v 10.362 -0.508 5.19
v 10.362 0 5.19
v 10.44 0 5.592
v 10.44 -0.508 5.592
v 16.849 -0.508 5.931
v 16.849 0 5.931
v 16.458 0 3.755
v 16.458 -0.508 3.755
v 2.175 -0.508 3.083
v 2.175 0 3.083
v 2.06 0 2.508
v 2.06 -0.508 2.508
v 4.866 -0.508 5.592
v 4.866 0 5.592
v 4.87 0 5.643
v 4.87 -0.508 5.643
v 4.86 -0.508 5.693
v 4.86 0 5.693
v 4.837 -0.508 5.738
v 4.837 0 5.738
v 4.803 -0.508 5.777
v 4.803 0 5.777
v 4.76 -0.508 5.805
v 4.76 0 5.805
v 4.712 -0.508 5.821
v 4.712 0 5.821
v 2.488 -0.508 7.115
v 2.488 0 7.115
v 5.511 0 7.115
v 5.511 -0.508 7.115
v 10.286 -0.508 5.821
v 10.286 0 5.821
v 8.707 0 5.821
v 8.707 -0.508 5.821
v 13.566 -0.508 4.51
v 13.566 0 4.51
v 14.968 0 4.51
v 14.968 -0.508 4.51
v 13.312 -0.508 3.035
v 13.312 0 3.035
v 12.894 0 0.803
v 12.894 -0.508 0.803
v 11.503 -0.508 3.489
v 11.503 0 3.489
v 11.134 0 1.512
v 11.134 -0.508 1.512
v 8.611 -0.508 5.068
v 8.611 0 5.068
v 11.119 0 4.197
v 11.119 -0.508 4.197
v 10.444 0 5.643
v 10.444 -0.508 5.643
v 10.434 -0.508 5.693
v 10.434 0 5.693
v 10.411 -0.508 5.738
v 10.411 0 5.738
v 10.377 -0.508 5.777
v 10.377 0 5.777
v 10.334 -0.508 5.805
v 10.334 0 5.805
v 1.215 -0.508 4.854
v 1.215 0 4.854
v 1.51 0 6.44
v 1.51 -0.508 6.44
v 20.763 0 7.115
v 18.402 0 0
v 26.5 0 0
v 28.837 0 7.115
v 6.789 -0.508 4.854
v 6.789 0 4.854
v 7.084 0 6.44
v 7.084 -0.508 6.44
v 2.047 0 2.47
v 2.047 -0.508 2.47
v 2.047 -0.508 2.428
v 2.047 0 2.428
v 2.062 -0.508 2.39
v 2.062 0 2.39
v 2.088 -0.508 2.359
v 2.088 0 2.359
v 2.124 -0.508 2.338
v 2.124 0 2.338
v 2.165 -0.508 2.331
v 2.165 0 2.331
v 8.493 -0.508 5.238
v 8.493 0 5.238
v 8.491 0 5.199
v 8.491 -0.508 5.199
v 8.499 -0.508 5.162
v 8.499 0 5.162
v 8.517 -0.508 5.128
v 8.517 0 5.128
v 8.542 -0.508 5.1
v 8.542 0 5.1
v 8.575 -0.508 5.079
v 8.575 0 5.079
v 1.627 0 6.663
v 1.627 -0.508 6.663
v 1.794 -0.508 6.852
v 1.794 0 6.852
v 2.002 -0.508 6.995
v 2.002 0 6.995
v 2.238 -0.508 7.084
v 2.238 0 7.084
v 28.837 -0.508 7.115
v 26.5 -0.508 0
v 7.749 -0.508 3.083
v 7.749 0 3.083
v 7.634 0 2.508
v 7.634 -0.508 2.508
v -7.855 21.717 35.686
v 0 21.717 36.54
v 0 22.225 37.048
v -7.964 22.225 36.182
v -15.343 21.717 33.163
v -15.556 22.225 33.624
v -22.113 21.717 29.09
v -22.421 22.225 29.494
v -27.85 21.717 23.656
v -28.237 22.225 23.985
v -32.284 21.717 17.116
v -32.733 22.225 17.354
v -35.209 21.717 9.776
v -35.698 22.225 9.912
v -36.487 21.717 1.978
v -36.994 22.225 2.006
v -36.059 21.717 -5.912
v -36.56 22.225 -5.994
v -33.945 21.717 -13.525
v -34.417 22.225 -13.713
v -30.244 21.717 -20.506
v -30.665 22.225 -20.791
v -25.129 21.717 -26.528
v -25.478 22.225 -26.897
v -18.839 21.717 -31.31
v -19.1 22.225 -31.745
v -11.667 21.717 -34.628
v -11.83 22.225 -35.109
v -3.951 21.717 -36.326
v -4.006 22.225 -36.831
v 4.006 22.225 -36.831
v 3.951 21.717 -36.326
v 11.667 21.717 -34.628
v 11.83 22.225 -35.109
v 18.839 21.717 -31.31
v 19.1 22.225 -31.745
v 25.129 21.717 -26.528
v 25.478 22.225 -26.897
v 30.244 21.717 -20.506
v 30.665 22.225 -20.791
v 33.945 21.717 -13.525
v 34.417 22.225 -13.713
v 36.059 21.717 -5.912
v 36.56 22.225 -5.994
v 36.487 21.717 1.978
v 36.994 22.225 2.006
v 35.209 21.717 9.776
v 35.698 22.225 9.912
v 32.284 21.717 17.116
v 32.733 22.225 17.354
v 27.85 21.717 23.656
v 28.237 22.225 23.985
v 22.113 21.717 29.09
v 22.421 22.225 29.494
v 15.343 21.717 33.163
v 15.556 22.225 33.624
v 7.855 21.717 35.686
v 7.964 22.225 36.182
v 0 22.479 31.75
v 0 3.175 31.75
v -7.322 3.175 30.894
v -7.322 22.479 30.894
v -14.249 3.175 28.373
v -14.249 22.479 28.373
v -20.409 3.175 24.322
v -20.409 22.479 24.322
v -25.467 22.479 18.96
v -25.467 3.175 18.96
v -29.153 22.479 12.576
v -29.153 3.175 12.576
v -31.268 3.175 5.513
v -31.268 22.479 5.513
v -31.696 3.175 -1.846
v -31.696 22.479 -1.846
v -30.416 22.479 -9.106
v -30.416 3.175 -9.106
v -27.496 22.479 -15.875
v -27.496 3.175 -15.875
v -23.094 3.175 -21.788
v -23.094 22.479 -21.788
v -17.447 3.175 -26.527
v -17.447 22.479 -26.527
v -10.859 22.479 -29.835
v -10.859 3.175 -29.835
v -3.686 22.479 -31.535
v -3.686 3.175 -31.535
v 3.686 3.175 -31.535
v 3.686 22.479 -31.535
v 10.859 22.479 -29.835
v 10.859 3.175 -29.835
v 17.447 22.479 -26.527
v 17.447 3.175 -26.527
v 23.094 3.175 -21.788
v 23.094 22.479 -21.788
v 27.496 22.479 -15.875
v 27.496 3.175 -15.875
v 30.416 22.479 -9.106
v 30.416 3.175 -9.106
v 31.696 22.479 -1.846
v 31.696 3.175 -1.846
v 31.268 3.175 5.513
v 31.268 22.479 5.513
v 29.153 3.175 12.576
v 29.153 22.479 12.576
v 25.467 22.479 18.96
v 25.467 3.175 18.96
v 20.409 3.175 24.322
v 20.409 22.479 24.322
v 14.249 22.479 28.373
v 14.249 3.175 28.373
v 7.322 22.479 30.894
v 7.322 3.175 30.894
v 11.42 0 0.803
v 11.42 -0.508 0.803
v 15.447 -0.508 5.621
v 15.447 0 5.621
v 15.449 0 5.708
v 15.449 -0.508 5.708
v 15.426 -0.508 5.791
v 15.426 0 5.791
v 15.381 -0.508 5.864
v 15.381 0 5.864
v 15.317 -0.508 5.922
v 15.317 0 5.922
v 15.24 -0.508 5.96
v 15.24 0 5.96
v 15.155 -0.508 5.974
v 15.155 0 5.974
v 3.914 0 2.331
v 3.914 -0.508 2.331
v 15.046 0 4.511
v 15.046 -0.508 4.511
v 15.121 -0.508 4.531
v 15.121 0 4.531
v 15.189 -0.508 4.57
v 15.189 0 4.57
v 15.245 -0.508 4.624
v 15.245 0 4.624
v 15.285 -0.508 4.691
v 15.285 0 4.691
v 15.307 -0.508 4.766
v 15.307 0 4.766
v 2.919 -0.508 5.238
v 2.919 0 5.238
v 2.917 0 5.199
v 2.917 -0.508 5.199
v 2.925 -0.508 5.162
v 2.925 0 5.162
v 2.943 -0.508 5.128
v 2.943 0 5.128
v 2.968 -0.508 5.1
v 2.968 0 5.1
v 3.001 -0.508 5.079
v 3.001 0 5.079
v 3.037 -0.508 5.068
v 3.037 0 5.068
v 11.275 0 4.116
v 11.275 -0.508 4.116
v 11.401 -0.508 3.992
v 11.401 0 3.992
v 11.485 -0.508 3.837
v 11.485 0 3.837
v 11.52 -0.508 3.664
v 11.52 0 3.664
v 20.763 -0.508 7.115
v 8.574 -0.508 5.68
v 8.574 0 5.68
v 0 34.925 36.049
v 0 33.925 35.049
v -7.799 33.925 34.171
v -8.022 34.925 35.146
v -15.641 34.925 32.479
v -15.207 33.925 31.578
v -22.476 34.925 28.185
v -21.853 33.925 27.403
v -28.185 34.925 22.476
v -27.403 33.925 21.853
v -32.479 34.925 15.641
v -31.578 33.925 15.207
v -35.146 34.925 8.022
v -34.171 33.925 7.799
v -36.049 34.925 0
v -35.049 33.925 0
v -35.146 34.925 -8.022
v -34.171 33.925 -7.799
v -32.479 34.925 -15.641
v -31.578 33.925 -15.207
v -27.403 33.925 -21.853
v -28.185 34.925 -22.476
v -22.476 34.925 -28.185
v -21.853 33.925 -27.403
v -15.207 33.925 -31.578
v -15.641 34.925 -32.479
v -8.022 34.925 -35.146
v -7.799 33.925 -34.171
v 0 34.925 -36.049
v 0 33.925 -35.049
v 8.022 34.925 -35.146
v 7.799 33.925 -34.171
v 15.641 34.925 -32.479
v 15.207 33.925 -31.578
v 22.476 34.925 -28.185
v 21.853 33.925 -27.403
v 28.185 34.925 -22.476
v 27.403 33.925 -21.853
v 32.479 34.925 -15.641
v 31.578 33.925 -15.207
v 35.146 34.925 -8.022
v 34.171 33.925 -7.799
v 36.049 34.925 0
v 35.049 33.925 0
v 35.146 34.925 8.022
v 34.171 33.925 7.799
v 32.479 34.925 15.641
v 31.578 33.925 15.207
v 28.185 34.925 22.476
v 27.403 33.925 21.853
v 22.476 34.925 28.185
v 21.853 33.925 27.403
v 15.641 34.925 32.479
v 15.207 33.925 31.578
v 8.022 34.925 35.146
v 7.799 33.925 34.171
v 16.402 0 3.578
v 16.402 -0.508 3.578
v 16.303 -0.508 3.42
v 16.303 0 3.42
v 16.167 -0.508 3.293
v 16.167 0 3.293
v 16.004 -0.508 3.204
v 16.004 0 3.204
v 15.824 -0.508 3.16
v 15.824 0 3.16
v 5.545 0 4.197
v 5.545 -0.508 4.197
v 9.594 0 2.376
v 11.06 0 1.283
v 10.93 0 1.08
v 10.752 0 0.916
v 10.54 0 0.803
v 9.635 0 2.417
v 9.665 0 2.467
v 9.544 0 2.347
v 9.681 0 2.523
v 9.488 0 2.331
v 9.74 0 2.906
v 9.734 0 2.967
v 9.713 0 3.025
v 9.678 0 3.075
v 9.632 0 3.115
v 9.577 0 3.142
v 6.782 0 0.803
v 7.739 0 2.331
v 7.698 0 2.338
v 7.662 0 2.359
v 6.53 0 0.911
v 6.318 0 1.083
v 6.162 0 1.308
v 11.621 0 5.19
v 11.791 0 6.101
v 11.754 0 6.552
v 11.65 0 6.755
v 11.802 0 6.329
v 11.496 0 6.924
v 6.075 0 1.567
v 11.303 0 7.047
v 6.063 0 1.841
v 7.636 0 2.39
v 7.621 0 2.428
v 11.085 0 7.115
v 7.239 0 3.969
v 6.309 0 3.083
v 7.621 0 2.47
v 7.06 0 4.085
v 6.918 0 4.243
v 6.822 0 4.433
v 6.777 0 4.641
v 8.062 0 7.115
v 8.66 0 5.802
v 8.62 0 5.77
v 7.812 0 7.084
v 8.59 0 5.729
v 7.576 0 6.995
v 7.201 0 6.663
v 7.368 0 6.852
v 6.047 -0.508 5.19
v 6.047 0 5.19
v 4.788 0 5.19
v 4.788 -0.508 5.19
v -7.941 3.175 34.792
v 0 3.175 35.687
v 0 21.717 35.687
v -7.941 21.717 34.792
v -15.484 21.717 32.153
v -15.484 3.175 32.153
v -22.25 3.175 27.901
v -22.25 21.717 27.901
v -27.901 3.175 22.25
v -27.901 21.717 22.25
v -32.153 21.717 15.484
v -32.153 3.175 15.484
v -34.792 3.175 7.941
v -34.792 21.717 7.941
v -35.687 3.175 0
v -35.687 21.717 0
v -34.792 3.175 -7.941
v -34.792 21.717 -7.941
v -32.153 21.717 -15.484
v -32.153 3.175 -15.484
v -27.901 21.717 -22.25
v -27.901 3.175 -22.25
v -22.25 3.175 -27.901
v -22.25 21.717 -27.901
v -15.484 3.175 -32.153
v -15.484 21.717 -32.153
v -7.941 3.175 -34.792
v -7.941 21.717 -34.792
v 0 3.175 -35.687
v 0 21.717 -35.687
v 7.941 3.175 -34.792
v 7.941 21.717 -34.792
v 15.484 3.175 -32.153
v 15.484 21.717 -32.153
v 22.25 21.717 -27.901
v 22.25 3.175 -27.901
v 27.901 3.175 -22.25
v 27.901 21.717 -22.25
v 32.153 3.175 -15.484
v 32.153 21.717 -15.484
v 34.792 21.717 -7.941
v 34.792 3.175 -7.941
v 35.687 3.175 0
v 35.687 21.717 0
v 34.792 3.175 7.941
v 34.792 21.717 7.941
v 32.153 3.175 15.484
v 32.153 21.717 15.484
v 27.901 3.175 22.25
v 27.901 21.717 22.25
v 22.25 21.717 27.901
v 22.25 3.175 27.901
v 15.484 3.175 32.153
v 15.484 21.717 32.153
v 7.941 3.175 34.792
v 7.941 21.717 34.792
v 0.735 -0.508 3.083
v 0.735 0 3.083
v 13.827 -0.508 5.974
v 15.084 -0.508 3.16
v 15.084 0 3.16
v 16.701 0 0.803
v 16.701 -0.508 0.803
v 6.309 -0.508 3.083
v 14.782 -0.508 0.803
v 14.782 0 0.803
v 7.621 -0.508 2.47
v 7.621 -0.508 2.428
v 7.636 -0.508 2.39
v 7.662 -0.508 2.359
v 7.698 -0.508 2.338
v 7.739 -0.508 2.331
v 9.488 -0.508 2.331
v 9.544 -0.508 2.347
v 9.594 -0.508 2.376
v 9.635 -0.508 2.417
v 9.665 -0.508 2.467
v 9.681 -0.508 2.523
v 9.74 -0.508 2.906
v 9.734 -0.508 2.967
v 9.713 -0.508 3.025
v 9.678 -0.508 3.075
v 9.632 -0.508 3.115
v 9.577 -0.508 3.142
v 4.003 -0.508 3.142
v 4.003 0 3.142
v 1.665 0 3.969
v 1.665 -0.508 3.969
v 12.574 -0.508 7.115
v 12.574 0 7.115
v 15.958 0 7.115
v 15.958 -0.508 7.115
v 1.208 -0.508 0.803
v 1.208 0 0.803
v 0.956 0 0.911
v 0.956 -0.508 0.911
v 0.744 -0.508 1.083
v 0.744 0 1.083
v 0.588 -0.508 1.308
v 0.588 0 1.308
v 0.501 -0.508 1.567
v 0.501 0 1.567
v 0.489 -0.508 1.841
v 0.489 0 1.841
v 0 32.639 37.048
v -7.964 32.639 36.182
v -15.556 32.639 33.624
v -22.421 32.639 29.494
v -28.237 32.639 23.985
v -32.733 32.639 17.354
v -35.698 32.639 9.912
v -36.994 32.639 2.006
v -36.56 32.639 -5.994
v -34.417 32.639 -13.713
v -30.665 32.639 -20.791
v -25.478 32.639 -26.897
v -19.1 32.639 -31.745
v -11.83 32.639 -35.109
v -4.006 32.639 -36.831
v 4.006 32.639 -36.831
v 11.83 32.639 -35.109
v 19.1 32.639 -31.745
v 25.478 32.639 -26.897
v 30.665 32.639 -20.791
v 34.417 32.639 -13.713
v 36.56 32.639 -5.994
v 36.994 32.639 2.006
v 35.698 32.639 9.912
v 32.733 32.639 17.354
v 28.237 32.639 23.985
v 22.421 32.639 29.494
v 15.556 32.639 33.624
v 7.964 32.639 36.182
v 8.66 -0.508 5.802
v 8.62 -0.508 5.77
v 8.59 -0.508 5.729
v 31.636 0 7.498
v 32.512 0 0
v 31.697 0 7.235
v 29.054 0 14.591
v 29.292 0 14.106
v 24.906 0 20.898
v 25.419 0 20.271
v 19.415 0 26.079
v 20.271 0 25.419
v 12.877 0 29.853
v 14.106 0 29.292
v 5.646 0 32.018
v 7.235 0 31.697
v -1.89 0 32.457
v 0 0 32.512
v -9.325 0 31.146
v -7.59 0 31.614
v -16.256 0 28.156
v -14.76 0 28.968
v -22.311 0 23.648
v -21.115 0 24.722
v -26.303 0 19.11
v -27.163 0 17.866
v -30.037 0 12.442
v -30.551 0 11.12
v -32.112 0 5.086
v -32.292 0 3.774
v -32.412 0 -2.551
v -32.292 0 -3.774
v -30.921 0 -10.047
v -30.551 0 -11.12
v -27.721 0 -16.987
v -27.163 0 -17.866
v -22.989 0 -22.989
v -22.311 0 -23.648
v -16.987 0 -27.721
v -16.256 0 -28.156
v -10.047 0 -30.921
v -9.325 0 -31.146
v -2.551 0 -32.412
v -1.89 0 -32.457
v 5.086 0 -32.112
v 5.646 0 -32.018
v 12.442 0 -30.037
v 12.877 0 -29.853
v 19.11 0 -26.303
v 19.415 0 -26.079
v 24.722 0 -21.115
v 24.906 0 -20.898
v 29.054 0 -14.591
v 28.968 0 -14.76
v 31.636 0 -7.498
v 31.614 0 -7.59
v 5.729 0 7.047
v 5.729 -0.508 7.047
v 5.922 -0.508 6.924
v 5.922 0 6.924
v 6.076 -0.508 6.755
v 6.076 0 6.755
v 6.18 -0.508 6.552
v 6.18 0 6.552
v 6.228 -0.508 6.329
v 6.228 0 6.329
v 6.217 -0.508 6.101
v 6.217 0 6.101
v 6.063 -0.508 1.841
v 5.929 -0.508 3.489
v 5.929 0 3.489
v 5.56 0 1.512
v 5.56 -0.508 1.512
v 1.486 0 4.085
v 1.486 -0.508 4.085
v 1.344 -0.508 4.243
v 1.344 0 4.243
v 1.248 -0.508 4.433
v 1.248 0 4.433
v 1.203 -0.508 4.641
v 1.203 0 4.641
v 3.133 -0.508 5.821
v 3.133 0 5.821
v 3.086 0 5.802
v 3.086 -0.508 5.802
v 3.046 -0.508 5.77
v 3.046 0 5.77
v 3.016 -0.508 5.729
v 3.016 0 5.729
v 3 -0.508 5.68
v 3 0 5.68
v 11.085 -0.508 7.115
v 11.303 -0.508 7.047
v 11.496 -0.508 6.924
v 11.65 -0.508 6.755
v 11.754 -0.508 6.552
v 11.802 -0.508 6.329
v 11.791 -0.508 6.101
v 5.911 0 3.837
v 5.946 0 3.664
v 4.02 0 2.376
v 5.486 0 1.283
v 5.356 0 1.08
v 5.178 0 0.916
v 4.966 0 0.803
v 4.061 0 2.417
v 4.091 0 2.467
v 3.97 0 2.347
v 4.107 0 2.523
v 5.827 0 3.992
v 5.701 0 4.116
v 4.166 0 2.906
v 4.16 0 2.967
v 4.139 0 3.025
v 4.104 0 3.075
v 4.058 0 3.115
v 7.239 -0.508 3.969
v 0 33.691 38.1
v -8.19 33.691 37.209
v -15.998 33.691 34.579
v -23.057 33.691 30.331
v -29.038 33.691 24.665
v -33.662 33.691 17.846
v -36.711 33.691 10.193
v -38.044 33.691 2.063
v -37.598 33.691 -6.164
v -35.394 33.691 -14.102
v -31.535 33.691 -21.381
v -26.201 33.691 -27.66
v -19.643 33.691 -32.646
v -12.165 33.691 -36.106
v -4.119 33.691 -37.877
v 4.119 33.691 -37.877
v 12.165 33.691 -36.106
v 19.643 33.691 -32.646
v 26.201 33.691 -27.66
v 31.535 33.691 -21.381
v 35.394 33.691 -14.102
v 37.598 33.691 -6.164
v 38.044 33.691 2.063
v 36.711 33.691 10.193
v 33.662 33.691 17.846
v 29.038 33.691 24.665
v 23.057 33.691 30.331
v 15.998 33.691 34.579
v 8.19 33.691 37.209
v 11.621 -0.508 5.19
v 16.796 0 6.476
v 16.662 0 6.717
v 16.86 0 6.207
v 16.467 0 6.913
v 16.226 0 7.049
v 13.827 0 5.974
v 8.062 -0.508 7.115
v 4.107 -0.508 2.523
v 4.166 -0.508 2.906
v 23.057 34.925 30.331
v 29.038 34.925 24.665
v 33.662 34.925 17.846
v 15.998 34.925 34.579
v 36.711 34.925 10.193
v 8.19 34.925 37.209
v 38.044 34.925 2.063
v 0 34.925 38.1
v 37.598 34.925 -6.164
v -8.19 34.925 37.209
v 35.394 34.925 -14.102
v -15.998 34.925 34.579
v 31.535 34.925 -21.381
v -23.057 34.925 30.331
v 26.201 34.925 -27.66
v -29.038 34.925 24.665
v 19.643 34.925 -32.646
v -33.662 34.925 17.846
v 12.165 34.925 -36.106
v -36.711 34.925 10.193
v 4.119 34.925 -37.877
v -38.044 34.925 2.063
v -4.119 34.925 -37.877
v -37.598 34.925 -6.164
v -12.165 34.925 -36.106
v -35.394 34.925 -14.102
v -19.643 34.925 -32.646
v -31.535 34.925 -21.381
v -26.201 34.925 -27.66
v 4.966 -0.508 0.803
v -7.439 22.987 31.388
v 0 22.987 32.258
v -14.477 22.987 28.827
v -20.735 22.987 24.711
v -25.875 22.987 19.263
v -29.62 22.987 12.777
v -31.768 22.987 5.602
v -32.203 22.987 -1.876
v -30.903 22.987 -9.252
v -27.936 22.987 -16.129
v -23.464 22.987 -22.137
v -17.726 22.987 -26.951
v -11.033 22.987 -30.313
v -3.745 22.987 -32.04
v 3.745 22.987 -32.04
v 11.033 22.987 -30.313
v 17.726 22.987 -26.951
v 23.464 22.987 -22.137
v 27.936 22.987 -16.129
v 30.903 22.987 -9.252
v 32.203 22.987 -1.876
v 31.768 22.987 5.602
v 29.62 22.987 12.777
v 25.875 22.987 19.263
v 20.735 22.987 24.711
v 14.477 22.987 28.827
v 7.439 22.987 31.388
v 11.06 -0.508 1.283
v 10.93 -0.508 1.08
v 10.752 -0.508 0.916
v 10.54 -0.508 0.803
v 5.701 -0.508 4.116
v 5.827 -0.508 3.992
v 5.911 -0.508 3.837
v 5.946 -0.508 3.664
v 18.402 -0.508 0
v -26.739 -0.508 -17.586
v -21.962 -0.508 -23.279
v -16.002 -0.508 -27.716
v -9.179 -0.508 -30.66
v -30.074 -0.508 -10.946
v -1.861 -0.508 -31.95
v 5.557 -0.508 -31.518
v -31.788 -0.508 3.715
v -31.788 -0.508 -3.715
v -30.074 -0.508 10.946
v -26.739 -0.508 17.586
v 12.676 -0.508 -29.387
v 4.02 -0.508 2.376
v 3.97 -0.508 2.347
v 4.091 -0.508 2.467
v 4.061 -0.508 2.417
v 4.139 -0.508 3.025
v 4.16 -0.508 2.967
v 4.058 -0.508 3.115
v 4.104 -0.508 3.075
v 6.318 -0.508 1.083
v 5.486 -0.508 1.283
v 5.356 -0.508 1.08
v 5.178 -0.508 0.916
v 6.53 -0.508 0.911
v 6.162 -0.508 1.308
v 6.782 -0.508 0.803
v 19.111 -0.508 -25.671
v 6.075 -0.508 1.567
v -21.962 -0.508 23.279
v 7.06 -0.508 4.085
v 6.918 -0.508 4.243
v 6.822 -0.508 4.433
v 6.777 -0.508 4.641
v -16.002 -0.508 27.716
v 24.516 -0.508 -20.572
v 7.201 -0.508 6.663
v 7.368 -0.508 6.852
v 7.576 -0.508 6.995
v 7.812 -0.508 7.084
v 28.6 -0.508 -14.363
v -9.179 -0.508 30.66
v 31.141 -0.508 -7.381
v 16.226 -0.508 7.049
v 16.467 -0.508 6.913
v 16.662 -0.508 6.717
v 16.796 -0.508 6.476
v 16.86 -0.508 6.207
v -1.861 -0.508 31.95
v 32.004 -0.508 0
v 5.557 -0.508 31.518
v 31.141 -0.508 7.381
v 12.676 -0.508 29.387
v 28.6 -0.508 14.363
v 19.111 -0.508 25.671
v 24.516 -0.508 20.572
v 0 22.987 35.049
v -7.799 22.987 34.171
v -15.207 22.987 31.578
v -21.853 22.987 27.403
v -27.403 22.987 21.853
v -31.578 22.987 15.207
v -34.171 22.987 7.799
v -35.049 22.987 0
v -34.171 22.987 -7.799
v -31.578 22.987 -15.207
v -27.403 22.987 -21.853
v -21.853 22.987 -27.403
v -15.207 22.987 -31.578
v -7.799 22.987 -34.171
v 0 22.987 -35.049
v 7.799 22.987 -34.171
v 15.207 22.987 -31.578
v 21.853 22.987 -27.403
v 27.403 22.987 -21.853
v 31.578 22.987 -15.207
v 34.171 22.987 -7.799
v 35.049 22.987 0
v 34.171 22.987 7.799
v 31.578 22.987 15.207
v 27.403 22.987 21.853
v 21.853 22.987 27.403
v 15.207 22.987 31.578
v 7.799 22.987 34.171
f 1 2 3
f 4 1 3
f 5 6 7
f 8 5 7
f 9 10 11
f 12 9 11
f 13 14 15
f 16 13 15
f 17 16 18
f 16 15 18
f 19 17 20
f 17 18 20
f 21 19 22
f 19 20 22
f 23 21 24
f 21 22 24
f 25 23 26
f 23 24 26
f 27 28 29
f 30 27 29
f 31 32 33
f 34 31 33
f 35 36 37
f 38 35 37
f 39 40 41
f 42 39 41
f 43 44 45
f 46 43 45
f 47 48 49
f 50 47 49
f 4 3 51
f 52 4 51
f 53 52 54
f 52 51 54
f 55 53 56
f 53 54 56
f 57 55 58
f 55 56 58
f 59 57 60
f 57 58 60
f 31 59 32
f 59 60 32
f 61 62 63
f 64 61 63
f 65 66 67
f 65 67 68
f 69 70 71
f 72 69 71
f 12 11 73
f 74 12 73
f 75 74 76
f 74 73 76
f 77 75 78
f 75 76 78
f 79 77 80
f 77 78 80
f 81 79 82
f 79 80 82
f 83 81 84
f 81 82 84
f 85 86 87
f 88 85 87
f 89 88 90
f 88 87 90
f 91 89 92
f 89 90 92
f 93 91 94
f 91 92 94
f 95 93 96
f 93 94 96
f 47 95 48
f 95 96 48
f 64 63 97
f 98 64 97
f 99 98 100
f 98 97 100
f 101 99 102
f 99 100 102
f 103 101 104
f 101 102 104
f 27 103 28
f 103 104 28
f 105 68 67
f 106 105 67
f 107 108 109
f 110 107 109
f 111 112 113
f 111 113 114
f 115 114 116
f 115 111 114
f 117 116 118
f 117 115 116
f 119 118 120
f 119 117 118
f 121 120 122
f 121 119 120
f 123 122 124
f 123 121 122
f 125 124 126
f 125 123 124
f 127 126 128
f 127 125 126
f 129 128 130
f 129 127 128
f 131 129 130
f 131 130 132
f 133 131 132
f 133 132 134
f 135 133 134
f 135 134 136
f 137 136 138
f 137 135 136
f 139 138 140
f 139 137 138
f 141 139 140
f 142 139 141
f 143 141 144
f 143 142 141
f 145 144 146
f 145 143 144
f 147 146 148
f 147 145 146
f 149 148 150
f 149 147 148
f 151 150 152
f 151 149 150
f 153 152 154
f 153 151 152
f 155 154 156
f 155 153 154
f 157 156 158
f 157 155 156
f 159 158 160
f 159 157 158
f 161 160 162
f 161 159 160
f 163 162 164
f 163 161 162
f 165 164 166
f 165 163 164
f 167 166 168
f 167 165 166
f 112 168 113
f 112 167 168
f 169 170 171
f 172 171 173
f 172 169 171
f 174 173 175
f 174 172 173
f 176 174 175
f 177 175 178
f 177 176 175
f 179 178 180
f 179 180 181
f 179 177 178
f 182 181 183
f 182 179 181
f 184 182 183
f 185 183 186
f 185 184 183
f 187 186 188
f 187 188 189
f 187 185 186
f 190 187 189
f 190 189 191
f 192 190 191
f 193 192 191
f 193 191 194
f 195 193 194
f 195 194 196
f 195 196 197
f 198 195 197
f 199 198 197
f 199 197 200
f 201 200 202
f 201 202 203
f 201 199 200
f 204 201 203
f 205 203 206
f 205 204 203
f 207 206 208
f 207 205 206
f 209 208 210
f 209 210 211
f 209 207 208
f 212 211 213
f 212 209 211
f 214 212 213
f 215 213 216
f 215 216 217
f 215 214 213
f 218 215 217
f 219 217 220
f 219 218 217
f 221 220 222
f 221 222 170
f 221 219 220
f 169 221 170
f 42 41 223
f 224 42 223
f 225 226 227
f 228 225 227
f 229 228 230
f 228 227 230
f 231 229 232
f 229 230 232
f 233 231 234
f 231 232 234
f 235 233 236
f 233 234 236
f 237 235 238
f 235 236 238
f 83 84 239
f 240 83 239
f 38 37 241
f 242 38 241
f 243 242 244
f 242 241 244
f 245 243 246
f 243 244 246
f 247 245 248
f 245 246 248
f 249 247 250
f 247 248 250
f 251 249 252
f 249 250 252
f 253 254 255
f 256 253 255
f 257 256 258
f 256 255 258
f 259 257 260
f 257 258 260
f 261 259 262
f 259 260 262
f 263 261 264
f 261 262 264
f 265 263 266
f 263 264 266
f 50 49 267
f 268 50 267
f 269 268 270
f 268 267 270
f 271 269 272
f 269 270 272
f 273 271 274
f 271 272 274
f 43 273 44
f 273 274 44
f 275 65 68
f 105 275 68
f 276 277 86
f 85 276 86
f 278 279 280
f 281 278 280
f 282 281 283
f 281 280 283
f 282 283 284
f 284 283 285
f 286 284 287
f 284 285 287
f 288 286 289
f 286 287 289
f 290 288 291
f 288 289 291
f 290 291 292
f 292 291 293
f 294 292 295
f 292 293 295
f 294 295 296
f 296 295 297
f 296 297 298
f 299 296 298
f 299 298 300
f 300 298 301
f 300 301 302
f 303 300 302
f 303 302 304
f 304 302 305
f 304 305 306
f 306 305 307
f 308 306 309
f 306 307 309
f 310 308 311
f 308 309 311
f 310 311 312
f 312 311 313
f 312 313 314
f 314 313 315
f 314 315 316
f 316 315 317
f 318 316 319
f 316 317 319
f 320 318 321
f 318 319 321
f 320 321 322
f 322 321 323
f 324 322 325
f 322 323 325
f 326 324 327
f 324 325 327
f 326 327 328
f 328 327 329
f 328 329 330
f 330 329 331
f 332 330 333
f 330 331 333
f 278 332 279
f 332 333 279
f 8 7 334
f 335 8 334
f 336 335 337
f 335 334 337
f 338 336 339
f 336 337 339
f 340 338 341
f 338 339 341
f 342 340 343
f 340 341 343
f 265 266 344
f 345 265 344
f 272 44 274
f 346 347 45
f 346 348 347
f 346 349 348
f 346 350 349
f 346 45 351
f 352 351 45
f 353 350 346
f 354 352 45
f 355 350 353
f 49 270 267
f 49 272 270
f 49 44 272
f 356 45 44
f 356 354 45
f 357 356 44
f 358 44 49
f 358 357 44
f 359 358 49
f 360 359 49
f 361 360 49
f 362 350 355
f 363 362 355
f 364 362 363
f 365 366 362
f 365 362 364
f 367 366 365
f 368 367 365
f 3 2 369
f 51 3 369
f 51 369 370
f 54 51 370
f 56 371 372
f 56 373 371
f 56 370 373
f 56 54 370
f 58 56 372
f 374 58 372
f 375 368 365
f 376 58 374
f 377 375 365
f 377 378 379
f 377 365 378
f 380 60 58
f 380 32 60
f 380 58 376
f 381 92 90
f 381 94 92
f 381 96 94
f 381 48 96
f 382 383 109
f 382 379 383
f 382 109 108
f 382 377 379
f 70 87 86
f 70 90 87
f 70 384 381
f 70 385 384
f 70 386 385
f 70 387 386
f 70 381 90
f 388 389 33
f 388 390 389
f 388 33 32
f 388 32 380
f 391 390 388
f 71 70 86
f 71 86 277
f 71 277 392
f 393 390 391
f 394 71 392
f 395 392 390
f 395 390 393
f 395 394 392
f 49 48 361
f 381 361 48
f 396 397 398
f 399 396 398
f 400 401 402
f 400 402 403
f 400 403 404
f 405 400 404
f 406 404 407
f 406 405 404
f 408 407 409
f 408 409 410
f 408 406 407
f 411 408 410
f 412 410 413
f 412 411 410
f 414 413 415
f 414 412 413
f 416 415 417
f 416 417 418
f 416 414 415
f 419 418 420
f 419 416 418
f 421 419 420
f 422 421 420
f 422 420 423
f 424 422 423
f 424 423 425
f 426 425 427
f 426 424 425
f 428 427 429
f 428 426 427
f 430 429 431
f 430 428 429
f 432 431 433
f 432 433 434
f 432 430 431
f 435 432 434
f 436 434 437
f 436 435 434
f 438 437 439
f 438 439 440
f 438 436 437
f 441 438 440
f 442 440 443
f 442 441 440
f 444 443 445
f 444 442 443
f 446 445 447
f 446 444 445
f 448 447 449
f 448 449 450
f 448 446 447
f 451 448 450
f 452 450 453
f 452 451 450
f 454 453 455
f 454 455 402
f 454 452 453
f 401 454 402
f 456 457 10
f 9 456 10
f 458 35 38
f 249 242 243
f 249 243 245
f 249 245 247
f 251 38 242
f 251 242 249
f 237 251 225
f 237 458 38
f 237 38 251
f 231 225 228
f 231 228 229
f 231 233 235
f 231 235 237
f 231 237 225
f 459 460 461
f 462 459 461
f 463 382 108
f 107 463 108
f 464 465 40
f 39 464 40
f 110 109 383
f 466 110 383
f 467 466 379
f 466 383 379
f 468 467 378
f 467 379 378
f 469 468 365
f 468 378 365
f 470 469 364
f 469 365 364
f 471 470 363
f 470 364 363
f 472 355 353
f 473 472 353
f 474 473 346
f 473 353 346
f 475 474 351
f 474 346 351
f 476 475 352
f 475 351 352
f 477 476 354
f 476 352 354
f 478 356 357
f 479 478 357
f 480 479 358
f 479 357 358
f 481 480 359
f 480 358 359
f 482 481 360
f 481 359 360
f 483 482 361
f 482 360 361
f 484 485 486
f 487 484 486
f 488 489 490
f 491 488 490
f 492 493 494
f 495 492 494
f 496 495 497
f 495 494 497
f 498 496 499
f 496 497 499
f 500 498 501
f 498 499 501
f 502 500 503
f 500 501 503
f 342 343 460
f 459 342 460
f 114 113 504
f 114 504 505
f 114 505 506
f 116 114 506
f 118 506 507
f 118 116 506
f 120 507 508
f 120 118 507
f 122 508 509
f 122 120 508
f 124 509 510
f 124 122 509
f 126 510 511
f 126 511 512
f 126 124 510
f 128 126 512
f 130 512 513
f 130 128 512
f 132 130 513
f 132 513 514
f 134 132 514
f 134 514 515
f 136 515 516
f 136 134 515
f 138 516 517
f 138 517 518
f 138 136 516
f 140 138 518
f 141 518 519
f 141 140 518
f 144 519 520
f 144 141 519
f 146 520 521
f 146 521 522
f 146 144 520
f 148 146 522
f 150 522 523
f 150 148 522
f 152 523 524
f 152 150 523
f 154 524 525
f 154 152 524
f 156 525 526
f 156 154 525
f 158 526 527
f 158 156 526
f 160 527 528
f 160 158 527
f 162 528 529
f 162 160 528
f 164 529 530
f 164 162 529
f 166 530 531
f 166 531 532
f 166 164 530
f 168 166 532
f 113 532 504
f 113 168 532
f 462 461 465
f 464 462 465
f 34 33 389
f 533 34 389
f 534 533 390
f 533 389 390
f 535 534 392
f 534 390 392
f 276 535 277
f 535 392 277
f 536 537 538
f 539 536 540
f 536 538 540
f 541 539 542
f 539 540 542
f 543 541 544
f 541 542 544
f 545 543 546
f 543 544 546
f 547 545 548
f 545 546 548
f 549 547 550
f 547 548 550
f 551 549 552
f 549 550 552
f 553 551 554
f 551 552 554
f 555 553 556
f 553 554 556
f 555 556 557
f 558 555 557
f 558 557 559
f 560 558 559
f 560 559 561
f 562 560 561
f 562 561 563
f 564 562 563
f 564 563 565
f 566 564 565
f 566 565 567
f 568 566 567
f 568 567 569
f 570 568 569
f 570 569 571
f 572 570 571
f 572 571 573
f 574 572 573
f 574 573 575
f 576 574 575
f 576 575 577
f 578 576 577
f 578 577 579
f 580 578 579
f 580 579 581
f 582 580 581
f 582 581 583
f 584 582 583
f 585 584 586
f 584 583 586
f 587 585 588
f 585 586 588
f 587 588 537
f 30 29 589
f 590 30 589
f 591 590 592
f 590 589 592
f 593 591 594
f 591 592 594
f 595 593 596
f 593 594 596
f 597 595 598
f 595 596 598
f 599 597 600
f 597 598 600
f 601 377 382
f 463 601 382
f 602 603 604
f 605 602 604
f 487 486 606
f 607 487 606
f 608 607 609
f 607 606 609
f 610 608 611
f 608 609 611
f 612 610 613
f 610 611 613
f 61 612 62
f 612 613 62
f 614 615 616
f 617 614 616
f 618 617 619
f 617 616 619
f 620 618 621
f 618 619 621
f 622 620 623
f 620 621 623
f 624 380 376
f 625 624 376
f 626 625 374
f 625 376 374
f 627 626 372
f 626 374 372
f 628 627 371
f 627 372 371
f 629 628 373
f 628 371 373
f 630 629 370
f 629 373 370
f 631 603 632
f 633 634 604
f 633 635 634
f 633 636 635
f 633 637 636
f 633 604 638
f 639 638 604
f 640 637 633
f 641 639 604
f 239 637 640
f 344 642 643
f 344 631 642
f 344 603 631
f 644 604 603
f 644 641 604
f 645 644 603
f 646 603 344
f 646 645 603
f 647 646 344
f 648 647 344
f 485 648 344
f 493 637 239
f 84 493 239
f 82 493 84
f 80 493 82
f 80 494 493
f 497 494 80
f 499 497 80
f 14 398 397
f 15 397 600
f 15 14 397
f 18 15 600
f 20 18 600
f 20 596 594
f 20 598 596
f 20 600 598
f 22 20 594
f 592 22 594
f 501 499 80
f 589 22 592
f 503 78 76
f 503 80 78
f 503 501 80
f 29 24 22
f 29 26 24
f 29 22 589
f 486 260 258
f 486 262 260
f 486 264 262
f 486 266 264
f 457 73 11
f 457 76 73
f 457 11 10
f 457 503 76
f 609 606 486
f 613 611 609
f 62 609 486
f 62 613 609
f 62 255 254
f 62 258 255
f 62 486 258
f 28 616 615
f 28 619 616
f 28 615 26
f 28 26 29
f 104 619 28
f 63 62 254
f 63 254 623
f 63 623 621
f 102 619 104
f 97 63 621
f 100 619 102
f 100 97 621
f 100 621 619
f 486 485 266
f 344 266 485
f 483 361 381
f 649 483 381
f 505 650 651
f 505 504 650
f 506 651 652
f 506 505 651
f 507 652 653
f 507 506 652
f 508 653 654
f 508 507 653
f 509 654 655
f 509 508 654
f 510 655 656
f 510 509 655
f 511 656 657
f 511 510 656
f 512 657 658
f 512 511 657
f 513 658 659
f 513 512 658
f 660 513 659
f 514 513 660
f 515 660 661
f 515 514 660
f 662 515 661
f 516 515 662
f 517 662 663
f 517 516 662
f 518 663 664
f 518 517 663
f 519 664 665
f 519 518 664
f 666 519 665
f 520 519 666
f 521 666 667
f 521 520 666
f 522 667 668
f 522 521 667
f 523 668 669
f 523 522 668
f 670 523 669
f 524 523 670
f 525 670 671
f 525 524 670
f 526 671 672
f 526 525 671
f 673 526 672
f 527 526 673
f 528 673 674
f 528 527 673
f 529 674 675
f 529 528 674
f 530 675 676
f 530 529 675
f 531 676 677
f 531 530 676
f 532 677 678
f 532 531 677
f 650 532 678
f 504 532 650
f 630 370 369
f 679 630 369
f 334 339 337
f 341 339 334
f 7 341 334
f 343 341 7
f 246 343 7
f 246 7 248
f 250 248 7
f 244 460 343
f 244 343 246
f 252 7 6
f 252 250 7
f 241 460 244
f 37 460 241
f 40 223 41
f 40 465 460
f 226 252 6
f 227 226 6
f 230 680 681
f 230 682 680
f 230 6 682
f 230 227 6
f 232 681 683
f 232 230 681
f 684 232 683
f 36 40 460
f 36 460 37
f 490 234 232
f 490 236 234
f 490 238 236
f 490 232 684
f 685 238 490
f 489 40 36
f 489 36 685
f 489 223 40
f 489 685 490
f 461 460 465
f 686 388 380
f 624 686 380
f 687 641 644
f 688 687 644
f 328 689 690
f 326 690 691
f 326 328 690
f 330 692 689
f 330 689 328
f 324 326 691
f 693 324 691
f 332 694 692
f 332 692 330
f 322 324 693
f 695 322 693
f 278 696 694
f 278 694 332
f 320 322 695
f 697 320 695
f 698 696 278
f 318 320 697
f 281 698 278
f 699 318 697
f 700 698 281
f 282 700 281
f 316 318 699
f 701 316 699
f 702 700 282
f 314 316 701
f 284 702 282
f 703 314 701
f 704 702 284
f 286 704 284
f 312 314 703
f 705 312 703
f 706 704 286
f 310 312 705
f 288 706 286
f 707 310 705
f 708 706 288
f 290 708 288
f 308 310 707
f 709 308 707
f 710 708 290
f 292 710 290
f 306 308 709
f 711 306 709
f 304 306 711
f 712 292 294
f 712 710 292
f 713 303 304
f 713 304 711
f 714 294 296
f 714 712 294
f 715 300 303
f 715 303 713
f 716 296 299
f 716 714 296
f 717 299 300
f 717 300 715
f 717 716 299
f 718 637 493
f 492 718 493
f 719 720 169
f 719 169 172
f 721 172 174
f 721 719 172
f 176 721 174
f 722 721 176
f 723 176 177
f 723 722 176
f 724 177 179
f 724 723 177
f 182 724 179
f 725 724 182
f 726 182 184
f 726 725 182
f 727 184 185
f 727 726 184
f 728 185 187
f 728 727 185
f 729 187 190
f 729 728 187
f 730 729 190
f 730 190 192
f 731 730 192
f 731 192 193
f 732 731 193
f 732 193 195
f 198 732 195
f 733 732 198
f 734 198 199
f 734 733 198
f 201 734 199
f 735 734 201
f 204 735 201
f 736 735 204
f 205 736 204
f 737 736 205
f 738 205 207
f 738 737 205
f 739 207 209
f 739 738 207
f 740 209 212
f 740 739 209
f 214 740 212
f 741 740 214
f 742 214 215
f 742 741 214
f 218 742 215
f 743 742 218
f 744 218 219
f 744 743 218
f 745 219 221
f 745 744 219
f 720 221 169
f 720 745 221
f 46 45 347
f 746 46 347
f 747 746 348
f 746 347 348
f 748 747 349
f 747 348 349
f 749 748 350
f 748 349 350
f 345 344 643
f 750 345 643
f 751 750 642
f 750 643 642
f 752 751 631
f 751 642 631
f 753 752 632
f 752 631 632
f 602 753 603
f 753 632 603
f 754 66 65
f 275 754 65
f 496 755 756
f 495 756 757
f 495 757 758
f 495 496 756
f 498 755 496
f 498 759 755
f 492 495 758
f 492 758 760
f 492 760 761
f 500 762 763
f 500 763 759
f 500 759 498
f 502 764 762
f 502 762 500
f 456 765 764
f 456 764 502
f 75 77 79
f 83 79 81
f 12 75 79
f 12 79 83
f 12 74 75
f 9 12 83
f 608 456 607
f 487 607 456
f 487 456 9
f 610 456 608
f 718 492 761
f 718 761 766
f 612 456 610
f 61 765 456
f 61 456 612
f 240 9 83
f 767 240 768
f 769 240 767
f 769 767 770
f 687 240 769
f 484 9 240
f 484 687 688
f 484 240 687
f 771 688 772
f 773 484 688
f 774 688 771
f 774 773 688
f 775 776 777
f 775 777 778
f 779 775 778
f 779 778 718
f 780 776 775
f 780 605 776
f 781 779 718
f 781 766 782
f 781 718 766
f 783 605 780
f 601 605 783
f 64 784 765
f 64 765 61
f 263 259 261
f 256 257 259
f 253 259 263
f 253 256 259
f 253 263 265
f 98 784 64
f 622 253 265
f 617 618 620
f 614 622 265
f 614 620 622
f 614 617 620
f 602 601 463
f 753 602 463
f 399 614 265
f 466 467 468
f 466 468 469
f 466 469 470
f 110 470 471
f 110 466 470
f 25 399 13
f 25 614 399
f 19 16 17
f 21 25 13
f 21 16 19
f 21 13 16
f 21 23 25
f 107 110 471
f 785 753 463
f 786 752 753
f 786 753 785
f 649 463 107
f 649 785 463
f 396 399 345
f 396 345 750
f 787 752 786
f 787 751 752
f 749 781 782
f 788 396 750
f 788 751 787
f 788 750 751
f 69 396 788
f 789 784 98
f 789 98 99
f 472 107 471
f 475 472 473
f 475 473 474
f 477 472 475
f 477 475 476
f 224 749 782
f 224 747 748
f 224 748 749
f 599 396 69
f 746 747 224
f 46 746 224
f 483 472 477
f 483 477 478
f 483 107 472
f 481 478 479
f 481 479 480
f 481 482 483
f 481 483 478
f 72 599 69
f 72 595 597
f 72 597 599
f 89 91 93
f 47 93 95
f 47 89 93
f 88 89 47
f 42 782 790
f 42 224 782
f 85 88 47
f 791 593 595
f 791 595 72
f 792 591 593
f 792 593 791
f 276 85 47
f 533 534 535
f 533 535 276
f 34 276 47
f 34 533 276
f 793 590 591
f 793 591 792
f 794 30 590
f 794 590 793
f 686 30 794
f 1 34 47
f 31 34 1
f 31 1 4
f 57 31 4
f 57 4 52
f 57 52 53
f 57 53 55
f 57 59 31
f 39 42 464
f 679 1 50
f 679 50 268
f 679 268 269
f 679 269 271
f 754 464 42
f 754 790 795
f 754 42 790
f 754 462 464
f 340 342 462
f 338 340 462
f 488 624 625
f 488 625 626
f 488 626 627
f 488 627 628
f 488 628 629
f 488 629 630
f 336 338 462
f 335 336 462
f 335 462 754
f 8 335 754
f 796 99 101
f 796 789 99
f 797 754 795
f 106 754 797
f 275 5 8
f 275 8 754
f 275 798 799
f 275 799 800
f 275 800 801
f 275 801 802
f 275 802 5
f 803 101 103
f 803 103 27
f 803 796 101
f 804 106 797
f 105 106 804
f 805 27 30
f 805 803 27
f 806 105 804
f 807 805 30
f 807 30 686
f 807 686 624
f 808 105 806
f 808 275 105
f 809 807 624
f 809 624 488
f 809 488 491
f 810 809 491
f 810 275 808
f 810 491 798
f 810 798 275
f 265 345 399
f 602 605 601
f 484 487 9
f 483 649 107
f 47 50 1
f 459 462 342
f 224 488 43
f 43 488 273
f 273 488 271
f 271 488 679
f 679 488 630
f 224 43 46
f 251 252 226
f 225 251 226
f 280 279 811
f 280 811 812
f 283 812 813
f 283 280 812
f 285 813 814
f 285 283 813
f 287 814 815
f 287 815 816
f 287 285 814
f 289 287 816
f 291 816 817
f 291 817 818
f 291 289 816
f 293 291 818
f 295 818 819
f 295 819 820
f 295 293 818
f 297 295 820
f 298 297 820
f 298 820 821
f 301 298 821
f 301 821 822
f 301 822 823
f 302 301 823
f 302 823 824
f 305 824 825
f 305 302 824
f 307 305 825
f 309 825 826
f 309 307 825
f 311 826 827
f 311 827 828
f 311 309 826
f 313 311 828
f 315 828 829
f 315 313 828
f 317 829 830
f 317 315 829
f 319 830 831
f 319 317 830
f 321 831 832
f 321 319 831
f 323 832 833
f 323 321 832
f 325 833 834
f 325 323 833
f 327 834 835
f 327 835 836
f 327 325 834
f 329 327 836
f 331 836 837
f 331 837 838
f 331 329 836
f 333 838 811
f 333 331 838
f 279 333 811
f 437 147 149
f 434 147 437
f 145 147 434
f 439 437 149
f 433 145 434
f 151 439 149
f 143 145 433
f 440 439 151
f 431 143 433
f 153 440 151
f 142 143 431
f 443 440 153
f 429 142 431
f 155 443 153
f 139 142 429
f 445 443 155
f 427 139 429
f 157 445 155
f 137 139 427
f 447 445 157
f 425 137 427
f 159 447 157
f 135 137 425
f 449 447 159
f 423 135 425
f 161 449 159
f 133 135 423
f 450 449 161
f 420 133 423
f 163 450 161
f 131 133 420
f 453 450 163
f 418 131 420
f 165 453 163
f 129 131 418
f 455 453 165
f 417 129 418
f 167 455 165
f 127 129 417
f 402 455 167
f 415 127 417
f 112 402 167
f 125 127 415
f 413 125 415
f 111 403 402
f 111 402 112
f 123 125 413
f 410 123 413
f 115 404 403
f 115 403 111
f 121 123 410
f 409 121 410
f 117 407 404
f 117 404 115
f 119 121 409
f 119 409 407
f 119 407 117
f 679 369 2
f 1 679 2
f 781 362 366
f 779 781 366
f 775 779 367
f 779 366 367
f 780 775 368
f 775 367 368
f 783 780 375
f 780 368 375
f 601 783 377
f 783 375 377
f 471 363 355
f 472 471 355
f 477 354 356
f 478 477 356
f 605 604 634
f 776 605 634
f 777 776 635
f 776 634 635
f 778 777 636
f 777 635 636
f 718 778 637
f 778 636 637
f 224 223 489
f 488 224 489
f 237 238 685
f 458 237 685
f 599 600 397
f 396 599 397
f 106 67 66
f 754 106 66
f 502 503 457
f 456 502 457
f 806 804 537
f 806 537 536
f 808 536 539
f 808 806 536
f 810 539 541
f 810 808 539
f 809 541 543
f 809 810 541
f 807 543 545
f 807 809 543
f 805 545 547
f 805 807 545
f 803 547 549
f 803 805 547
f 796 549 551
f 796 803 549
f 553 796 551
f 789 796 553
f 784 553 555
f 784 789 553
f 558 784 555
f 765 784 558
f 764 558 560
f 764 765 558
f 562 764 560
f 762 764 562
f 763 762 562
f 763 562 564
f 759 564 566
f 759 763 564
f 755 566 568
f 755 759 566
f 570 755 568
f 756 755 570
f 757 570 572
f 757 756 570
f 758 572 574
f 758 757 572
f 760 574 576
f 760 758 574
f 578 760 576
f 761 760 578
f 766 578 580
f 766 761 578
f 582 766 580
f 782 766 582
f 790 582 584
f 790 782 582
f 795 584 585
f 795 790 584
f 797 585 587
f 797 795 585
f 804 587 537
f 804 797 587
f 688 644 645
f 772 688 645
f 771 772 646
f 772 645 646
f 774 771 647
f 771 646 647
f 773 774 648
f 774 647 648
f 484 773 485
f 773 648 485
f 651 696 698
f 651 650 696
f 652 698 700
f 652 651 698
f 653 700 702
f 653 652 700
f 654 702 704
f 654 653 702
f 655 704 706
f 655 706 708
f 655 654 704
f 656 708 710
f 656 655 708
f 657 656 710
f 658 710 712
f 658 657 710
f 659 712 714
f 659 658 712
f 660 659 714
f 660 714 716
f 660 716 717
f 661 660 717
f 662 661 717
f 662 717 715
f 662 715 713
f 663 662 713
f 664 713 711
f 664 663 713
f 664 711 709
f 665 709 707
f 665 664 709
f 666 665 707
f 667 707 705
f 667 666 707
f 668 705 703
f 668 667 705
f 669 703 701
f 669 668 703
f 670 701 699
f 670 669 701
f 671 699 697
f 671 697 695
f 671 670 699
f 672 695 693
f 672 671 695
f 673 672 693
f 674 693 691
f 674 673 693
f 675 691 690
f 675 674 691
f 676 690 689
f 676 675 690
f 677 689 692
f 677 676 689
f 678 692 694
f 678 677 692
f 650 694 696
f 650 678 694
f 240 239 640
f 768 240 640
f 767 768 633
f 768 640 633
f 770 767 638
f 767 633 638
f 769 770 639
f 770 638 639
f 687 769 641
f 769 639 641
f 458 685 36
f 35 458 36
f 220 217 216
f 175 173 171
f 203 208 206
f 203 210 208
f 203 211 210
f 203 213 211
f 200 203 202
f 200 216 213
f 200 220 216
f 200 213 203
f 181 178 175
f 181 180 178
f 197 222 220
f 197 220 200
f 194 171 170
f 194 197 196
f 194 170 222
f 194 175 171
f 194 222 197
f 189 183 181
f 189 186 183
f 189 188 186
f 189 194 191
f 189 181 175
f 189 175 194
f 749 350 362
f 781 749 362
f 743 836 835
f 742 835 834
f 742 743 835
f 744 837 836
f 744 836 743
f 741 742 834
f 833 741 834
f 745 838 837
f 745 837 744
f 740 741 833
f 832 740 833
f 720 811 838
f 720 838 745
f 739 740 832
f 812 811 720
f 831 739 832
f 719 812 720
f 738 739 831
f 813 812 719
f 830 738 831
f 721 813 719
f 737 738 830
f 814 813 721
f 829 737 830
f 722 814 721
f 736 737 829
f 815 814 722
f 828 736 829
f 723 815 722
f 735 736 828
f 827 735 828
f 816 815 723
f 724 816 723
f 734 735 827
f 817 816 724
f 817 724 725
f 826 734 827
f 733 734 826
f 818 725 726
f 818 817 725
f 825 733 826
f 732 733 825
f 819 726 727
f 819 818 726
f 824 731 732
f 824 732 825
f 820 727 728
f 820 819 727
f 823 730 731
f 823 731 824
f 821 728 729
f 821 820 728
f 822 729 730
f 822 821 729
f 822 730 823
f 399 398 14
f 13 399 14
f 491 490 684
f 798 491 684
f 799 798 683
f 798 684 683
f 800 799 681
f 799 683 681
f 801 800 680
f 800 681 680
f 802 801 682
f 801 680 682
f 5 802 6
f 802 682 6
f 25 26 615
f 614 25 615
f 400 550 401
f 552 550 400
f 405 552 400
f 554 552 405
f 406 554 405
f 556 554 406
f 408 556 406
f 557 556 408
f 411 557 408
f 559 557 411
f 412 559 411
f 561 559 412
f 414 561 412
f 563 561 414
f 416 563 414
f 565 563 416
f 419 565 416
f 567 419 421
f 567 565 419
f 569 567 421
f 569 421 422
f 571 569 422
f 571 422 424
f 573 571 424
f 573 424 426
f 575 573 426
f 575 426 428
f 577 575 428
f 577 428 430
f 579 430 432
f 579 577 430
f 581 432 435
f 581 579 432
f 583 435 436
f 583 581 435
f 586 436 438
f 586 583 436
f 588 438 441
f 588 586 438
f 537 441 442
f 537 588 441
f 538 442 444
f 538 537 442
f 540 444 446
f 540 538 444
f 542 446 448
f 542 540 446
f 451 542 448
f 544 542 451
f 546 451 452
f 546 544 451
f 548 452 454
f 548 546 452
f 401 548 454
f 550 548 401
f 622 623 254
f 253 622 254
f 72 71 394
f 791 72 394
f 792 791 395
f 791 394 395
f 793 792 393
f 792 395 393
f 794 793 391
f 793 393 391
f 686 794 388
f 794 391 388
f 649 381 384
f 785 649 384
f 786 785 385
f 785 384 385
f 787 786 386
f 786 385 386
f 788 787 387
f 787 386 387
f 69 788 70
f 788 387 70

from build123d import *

# Parameters (mm, degrees)
F2_SIZE  = 0.508
F3_SIZE  = 3.175
F4_R     = 32.512
F5_DEPTH = 0.508
F6_SIZE  = 0.50799
F7_SIZE  = 1


# Not quite as in the source:
# - a fillet or chamfer is up to 0.001 mm smaller than in the source, because OpenCascade refuses the exact size


with BuildPart() as f1:
    # F0 (on Right) → F1 (revolve)
    with BuildSketch(Plane.YZ):
        Polygon((0, 35.687), (0, 0), (3.175, 0), (3.175, 31.75), (22.987, 31.75), (22.987, 35.04946), (34.925, 35.04946), (34.925, 38.1), (33.69056, 38.1), (32.639, 37.04844), (21.717, 37.04844), (21.717, 35.687), align=None)
    revolve(axis=Axis((0, 1.5875, 0), (0, -1, 0)))

    # F2
    f2_edges = [f1.edges().sort_by_distance(p)[0] for p in [
        (0, 21.717, -37.04844),
        (0, 22.987, -31.75),
    ]]
    chamfer(f2_edges, length=F2_SIZE)

    # F3
    f3_edges = [f1.edges().sort_by_distance(p)[0] for p in [
        (0, 0, -35.687),
    ]]
    chamfer(f3_edges, length=F3_SIZE)

    # F4 (on face) → F5 (join)
    with BuildSketch(Plane.XZ):
        Circle(F4_R)
        with BuildLine():
            ThreePointArc((1.509855967, 6.4400210977), (1.8937491355, 6.9297046378), (2.4878198747, 7.1147556882))
            Line((2.4878198747, 7.1147556882), (5.5111409165, 7.1147556882))
            ThreePointArc((5.5111409165, 7.1147556882), (6.0757301057, 6.7551068727), (6.2165134586, 6.1006695032))
            Line((6.2165134586, 6.1006695032), (6.0470685713, 5.1900157705))
            Line((6.0470685713, 5.1900157705), (4.7878890863, 5.1900157705))
            Line((4.7878890863, 5.1900157705), (4.8664845526, 5.5916425772))
            ThreePointArc((4.8664845526, 5.5916425772), (4.836723562, 5.7383814637), (4.7118113372, 5.8209341951))
            Line((4.7118113372, 5.8209341951), (3.1333588995, 5.8209341951))
            ThreePointArc((3.1333588995, 5.8209341951), (3.0458218752, 5.7703284959), (3.0000514816, 5.6801689789))
            Line((3.0000514816, 5.6801689789), (2.9189020861, 5.2375365049))
            ThreePointArc((2.9189020861, 5.2375365049), (2.9425937197, 5.1281238685), (3.0369379092, 5.0678611733))
            Line((3.0369379092, 5.0678611733), (5.5451882072, 4.1973507032))
            ThreePointArc((5.5451882072, 4.1973507032), (5.8744055755, 3.9176753087), (5.9288027696, 3.4891390242))
            Line((5.9288027696, 3.4891390242), (5.5599426851, 1.5120476019))
            ThreePointArc((5.5599426851, 1.5120476019), (5.3557662432, 1.0797199091), (4.9655372277, 0.8034653729))
            Line((4.9655372277, 0.8034653729), (1.2082514586, 0.8034653729))
            ThreePointArc((1.2082514586, 0.8034653729), (0.6584047868, 1.1902455436), (0.4886787001, 1.8407248426))
            Line((0.4886787001, 1.8407248426), (0.7345082122, 3.0832483899))
            Line((0.7345082122, 3.0832483899), (2.1749762818, 3.0832483899))
            Line((2.1749762818, 3.0832483899), (2.0602140576, 2.5084333029))
            ThreePointArc((2.0602140576, 2.5084333029), (2.0616584556, 2.3899178369), (2.1645433735, 2.3310731631))
            Line((2.1645433735, 2.3310731631), (3.9138016291, 2.3310731631))
            ThreePointArc((3.9138016291, 2.3310731631), (4.0417506777, 2.3951715526), (4.1066328995, 2.5227249134))
            Line((4.1066328995, 2.5227249134), (4.1656503454, 2.9063397087))
            ThreePointArc((4.1656503454, 2.9063397087), (4.1228902349, 3.0507674018), (4.0033520199, 3.1424101908))
            Line((4.0033520199, 3.1424101908), (1.6647774028, 3.9686574601))
            ThreePointArc((1.6647774028, 3.9686574601), (1.2895839844, 4.3349438035), (1.2147676898, 4.8539219424))
            Line((1.2147676898, 4.8539219424), (1.509855967, 6.4400210977))
        make_face(mode=Mode.SUBTRACT)
        with BuildLine():
            Line((6.0626888962, 1.8407248426), (6.3085184083, 3.0832483899))
            Line((6.3085184083, 3.0832483899), (7.748986478, 3.0832483899))
            Line((7.748986478, 3.0832483899), (7.6342242537, 2.5084333029))
            ThreePointArc((7.6342242537, 2.5084333029), (7.6356686517, 2.3899178369), (7.7385535697, 2.3310731631))
            Line((7.7385535697, 2.3310731631), (9.4878118252, 2.3310731631))
            ThreePointArc((9.4878118252, 2.3310731631), (9.6157608738, 2.3951715526), (9.6806430956, 2.5227249134))
            Line((9.6806430956, 2.5227249134), (9.7396605415, 2.9063397087))
            ThreePointArc((9.7396605415, 2.9063397087), (9.696900431, 3.0507674018), (9.5773622161, 3.1424101908))
            Line((9.5773622161, 3.1424101908), (7.2387875989, 3.9686574601))
            ThreePointArc((7.2387875989, 3.9686574601), (6.8635941806, 4.3349438035), (6.788777886, 4.8539219424))
            Line((6.788777886, 4.8539219424), (7.0838661632, 6.4400210977))
            ThreePointArc((7.0838661632, 6.4400210977), (7.4677593317, 6.9297046378), (8.0618300708, 7.1147556882))
            Line((8.0618300708, 7.1147556882), (11.0851511126, 7.1147556882))
            ThreePointArc((11.0851511126, 7.1147556882), (11.6497403019, 6.7551068727), (11.7905236548, 6.1006695032))
            Line((11.7905236548, 6.1006695032), (11.6210787675, 5.1900157705))
            Line((11.6210787675, 5.1900157705), (10.3618992824, 5.1900157705))
            Line((10.3618992824, 5.1900157705), (10.4404947488, 5.5916425772))
            ThreePointArc((10.4404947488, 5.5916425772), (10.4107337581, 5.7383814637), (10.2858215333, 5.8209341951))
            Line((10.2858215333, 5.8209341951), (8.7073690956, 5.8209341951))
            ThreePointArc((8.7073690956, 5.8209341951), (8.6198320713, 5.7703284959), (8.5740616778, 5.6801689789))
            Line((8.5740616778, 5.6801689789), (8.4929122822, 5.2375365049))
            ThreePointArc((8.4929122822, 5.2375365049), (8.5166039159, 5.1281238685), (8.6109481053, 5.0678611733))
            Line((8.6109481053, 5.0678611733), (11.1191984033, 4.1973507032))
            ThreePointArc((11.1191984033, 4.1973507032), (11.4484157717, 3.9176753087), (11.5028129658, 3.4891390242))
            Line((11.5028129658, 3.4891390242), (11.1339528812, 1.5120476019))
            ThreePointArc((11.1339528812, 1.5120476019), (10.9297764394, 1.0797199091), (10.5395474238, 0.8034653729))
            Line((10.5395474238, 0.8034653729), (6.7822616547, 0.8034653729))
            ThreePointArc((6.7822616547, 0.8034653729), (6.232414983, 1.1902455436), (6.0626888962, 1.8407248426))
        make_face(mode=Mode.SUBTRACT)
        with BuildLine():
            Line((15.0836538523, 3.1598797068), (16.7005891971, 0.8034653729))
            Line((16.7005891971, 0.8034653729), (14.781959715, 0.8034653729))
            Line((14.781959715, 0.8034653729), (13.311708346, 3.0348771252))
            Line((13.311708346, 3.0348771252), (12.8936721012, 0.8034653729))
            Line((12.8936721012, 0.8034653729), (11.4200627431, 0.8034653729))
            Line((11.4200627431, 0.8034653729), (12.5739071518, 7.1147556882))
            Line((12.5739071518, 7.1147556882), (15.9580335021, 7.1147556882))
            ThreePointArc((15.9580335021, 7.1147556882), (16.6617692136, 6.7173463158), (16.8489553034, 5.9311278164))
            Line((16.8489553034, 5.9311278164), (16.4579637349, 3.7548521068))
            ThreePointArc((16.4579637349, 3.7548521068), (16.2392824666, 3.3522910872), (15.8235244453, 3.1598797068))
            Line((15.8235244453, 3.1598797068), (15.0836538523, 3.1598797068))
        make_face(mode=Mode.SUBTRACT)
        Polygon((26.1573679745, 7.1147556882), (28.8369659559, 7.1147556882), (26.4996811748, 0), (23.7947255373, 0), (21.1136136204, 0), (18.4020102024, 0), (20.7625944167, 7.1147556882), (23.4577525407, 7.1147556882), align=None, mode=Mode.SUBTRACT)
        with BuildLine():
            Line((15.154549852, 5.9737088159), (13.8270081952, 5.9737088159))
            Line((13.8270081952, 5.9737088159), (13.5664623231, 4.509691149))
            Line((13.5664623231, 4.509691149), (14.9684455246, 4.509691149))
            ThreePointArc((14.9684455246, 4.509691149), (15.1889852841, 4.5698286448), (15.3071191162, 4.7655291855))
            Line((15.3071191162, 4.7655291855), (15.4472859576, 5.6212851778))
            ThreePointArc((15.4472859576, 5.6212851778), (15.3812525761, 5.8642259453), (15.154549852, 5.9737088159))
        make_face()
    extrude(amount=F5_DEPTH)

    # F6 (size 0.508 in the source; OpenCascade refuses exactly that, so slightly less here)
    f6_edges = [f1.edges().sort_by_distance(p)[0] for p in [
        (0, 12.446, 35.687),
        (-32.512, -0.508, 0),
    ]]
    chamfer(f6_edges, length=F6_SIZE)

    # F7
    f7_edges = [f1.edges().sort_by_distance(p)[0] for p in [
        (0, 34.925, -35.04946),
    ]]
    chamfer(f7_edges, length=F7_SIZE)


solid = f1.part
